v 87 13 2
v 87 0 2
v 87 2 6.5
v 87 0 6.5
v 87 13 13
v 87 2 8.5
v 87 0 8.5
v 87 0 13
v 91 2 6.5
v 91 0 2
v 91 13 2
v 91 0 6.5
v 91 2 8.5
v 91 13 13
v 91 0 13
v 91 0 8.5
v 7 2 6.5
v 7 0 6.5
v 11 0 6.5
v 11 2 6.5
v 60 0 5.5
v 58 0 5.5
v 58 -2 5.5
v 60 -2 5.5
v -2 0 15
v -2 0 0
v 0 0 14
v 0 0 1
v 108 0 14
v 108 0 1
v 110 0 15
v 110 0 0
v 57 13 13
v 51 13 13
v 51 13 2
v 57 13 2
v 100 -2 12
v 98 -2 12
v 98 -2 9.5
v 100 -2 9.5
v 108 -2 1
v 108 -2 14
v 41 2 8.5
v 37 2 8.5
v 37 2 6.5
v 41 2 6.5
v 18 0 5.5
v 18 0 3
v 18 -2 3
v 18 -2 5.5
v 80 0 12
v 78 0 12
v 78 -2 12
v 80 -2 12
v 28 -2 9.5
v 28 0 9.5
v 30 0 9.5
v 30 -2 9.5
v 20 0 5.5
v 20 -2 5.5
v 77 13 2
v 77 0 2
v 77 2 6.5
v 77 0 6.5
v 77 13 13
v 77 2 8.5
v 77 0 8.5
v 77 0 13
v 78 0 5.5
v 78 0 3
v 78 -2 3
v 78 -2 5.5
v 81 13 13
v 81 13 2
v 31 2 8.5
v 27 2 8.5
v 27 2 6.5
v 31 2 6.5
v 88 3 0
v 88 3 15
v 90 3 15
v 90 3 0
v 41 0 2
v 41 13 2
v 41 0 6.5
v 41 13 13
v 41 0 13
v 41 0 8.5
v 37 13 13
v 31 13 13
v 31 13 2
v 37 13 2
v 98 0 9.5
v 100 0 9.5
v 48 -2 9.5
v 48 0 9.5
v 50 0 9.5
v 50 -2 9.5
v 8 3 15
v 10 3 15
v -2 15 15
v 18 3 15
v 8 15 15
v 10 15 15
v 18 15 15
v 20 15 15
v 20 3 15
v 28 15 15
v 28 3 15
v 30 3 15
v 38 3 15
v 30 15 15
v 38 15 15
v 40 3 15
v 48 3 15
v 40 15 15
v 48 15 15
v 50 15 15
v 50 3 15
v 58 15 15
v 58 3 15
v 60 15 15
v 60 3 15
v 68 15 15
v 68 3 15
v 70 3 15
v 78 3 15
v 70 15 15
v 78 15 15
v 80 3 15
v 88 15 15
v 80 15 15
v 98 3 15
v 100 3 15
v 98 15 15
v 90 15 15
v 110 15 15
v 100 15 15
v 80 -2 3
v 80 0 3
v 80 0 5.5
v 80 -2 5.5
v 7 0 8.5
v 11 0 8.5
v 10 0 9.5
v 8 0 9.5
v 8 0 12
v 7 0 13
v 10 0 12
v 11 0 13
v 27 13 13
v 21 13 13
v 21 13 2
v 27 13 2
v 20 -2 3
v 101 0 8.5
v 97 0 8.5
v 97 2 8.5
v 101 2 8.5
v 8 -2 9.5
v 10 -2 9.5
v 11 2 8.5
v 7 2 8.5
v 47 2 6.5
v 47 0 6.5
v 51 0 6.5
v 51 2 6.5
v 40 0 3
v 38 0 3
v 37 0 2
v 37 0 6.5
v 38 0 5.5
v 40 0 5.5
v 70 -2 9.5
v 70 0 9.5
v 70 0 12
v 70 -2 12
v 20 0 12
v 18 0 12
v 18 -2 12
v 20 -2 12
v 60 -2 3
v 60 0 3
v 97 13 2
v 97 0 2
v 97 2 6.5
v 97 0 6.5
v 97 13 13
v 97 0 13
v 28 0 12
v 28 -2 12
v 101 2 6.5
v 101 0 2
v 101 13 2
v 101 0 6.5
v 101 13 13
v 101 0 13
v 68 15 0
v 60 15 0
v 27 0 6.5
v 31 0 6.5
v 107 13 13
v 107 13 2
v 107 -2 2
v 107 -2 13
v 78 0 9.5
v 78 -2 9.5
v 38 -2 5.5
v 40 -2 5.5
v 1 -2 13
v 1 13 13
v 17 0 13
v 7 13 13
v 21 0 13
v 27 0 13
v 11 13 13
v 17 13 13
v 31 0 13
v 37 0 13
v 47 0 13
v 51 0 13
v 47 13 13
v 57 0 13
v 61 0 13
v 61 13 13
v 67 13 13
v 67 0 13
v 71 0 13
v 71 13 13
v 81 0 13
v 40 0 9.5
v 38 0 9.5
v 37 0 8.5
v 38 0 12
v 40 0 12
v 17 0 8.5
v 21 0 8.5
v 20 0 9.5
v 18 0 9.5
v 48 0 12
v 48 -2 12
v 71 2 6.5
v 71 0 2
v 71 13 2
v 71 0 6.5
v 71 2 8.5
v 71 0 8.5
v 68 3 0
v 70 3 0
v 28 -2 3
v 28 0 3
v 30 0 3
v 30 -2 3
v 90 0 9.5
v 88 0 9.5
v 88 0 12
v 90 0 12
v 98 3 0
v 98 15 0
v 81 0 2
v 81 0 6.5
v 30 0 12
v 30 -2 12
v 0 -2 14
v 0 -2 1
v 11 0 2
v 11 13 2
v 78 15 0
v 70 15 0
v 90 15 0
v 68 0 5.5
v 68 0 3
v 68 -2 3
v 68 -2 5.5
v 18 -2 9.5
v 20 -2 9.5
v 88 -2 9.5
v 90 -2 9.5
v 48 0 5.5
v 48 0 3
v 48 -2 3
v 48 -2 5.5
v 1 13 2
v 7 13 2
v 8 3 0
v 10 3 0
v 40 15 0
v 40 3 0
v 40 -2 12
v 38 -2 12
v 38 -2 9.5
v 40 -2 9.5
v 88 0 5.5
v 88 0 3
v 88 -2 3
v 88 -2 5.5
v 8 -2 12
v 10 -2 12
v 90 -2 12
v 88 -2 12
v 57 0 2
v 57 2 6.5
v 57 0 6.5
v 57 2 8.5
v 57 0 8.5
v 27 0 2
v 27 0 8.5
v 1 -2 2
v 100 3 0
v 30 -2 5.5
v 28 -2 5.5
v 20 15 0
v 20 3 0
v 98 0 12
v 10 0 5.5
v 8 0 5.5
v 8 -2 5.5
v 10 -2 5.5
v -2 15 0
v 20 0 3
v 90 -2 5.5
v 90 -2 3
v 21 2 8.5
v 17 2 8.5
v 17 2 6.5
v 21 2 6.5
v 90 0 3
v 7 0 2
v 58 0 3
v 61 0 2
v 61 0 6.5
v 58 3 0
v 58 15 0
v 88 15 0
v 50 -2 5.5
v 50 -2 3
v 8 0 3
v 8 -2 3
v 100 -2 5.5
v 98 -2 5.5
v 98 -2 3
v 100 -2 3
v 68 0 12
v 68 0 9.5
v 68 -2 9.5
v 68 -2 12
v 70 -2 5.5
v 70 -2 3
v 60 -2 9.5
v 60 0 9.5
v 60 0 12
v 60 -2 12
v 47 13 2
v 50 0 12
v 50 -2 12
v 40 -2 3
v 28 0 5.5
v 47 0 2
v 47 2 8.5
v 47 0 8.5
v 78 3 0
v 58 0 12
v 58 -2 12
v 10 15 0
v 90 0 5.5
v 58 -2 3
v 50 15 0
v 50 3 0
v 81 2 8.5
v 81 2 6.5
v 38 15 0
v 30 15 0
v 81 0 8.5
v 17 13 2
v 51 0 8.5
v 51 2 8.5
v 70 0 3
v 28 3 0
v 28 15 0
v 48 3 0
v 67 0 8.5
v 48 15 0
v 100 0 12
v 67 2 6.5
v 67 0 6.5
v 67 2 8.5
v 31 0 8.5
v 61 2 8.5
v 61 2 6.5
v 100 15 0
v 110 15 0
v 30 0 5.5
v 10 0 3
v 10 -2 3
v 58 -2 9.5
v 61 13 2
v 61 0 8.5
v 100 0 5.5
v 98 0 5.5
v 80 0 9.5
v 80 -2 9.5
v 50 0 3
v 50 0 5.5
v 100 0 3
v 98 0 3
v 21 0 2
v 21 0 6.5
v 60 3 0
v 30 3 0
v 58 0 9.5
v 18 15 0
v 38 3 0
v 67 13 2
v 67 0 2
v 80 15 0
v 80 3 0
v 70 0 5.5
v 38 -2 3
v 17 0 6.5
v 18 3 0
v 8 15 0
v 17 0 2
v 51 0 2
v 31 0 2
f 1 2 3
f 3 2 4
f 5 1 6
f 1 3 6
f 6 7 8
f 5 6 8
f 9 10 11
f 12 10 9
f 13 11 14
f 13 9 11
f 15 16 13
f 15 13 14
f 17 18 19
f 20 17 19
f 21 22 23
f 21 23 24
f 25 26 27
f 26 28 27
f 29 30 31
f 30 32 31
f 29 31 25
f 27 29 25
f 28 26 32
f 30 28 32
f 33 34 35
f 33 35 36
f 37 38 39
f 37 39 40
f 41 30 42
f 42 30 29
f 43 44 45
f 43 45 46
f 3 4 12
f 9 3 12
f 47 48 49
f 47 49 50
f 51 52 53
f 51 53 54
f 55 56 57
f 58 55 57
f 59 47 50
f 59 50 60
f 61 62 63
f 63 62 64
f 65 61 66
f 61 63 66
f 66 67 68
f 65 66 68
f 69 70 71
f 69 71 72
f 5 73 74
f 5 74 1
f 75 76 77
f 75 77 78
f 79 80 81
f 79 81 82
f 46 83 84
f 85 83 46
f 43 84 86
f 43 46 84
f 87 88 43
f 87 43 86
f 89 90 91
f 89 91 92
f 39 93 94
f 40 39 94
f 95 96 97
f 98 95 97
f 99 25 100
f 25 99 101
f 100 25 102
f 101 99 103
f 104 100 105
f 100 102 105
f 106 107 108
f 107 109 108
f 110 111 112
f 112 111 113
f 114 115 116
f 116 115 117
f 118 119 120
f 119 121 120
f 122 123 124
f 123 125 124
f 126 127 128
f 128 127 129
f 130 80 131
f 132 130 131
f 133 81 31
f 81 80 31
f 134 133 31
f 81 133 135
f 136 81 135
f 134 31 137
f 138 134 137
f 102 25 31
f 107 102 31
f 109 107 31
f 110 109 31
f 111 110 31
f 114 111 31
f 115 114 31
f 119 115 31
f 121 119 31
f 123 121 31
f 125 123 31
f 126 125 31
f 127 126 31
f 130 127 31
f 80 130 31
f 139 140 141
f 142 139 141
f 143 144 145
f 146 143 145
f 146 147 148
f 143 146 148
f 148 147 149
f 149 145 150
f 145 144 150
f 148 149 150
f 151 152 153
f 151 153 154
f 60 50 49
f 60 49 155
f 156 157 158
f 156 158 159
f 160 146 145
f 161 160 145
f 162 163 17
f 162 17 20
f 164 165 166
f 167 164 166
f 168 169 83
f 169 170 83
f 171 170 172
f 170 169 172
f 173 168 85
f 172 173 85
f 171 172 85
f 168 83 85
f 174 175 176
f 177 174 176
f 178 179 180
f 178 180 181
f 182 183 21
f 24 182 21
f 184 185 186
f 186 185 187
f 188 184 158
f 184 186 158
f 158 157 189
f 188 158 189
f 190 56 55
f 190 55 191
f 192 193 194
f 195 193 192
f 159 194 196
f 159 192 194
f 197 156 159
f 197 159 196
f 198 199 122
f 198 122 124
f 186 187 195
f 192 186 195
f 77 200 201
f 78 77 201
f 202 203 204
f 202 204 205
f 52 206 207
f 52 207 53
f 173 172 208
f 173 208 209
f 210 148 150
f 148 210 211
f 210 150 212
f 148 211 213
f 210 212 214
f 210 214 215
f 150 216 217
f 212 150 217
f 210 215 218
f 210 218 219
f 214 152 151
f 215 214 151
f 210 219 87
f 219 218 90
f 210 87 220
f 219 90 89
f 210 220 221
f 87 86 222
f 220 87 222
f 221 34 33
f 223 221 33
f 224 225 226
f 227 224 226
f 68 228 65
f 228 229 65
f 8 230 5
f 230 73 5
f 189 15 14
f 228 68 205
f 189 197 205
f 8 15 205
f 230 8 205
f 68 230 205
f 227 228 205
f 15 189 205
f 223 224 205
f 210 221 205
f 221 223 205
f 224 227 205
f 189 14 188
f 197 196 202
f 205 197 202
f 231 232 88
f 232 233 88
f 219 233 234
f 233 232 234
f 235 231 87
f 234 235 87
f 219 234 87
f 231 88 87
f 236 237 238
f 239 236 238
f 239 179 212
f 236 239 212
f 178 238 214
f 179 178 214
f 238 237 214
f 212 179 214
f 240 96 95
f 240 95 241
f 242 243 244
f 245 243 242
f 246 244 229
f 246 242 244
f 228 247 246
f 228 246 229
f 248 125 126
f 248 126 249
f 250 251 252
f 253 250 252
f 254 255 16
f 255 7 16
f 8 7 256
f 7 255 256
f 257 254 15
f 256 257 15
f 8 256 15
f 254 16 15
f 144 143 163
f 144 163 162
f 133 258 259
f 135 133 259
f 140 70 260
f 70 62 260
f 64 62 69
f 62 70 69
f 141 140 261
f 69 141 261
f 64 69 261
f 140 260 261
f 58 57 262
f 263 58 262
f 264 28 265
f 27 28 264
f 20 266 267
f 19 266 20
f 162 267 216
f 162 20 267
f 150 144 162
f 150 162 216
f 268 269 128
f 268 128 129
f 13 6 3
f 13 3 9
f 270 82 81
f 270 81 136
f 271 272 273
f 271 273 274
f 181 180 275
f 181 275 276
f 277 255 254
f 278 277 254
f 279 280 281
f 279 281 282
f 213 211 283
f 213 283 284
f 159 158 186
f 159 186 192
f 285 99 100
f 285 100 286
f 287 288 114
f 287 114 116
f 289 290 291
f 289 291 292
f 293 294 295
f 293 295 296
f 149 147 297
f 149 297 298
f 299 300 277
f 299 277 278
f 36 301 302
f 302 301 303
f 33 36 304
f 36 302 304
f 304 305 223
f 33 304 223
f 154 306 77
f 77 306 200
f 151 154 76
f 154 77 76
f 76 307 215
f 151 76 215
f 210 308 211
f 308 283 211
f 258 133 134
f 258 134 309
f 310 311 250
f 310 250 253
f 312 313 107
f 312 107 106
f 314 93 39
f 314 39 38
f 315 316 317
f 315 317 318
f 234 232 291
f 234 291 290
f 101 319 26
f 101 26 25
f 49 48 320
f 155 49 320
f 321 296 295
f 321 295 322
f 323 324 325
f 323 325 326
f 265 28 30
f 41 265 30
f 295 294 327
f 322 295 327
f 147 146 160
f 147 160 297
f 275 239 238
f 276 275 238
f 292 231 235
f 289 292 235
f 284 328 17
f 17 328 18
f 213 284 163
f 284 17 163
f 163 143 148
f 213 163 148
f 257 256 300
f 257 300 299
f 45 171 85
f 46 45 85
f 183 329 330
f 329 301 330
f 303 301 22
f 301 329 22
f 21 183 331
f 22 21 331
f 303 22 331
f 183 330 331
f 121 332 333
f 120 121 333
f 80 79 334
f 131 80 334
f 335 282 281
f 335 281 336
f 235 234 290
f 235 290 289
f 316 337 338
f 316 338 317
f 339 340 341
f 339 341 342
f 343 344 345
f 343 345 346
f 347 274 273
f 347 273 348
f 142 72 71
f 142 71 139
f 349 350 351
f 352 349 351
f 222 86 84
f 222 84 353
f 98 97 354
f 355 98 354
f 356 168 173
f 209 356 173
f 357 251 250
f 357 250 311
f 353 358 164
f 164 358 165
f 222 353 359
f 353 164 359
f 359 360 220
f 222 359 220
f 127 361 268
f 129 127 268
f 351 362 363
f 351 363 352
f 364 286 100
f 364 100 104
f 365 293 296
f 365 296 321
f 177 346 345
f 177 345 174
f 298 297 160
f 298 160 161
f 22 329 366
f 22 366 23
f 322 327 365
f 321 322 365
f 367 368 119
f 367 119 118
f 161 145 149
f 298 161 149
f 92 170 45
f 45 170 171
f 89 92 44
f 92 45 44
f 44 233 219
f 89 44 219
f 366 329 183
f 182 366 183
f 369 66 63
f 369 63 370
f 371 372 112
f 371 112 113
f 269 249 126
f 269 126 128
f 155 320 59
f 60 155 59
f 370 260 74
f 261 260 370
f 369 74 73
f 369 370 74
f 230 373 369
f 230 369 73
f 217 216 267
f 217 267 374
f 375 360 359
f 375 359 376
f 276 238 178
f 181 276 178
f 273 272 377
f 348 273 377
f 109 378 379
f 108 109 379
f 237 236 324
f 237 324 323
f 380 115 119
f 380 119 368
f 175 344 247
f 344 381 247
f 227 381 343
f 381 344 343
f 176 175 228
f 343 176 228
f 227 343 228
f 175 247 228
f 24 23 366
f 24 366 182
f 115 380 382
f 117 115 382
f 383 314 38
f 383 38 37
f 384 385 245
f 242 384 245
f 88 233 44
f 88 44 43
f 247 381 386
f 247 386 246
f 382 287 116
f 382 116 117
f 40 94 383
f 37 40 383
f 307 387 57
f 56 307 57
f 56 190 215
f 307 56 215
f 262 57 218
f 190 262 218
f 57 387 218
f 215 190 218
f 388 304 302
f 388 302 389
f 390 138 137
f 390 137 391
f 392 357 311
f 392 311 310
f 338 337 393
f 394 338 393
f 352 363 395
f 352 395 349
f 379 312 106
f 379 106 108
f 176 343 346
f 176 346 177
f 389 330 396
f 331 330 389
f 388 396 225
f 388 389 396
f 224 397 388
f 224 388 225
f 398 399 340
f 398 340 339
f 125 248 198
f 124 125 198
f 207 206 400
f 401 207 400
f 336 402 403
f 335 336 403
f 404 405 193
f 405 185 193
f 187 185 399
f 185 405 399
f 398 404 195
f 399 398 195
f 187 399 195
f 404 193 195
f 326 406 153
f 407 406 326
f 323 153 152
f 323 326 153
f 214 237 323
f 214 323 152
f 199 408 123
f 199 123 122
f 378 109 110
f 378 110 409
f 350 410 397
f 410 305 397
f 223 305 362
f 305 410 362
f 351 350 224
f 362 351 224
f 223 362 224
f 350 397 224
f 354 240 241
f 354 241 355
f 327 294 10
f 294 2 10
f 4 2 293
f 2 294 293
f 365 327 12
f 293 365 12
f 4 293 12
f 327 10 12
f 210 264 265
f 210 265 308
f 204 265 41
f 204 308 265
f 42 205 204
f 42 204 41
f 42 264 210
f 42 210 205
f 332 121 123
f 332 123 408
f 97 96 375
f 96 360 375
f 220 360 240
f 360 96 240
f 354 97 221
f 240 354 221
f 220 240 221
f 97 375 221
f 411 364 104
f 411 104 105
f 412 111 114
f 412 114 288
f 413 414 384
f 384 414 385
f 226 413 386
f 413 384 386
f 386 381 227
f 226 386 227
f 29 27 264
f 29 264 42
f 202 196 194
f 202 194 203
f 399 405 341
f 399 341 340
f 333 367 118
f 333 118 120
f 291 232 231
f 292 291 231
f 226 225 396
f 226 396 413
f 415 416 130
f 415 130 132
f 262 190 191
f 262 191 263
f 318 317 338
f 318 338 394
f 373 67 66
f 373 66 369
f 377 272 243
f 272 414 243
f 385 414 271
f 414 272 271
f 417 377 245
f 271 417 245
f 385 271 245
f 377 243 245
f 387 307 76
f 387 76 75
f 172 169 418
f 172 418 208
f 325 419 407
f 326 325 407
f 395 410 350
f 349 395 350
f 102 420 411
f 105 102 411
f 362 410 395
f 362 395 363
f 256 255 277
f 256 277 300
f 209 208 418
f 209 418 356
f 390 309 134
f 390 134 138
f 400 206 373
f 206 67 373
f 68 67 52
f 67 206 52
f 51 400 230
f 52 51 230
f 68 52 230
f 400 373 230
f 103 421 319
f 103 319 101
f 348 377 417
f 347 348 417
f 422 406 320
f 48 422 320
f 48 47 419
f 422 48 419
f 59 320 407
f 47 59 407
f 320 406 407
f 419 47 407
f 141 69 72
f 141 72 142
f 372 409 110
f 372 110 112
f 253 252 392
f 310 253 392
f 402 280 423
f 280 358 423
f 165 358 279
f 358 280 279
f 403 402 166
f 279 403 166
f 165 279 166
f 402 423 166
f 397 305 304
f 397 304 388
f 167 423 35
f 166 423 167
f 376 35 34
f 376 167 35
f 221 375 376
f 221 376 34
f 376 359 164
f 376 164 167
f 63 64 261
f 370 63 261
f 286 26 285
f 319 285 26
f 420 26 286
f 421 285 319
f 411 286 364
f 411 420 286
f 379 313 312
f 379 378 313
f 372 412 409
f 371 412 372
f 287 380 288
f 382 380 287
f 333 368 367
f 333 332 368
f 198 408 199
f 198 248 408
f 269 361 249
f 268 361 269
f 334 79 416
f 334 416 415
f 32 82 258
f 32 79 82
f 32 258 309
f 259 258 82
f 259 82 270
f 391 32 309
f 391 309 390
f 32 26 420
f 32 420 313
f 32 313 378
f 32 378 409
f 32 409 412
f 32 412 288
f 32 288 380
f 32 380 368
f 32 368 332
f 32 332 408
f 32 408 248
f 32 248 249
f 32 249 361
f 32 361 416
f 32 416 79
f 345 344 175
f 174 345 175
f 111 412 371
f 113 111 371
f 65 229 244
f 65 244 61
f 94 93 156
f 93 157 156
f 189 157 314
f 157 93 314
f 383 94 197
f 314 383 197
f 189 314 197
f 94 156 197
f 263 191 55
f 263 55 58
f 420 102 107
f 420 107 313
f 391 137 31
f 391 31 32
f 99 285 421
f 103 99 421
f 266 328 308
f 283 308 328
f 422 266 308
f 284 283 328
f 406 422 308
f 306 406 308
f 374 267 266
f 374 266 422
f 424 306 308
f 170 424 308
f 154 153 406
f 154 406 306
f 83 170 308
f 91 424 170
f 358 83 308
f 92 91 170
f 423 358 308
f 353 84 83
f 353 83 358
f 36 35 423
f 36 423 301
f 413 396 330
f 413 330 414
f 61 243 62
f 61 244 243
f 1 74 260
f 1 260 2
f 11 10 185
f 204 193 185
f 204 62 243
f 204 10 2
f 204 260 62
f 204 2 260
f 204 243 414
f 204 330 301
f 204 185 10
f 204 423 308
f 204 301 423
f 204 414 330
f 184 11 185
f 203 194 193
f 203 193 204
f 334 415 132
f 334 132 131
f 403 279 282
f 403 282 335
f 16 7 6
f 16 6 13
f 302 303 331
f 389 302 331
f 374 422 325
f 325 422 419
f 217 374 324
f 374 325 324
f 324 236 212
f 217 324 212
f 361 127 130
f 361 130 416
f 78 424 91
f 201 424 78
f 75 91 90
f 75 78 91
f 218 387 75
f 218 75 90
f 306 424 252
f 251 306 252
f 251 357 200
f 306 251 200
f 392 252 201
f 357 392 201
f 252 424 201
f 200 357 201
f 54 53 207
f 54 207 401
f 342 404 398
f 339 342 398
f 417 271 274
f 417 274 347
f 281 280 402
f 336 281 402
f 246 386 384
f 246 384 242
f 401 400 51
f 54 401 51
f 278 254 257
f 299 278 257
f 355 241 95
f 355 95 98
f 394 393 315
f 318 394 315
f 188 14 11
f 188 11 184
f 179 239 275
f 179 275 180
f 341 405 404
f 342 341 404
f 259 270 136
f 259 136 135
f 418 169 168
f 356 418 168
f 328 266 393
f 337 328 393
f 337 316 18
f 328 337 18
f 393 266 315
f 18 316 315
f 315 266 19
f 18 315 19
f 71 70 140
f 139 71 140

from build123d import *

# Parameters (mm, degrees)
SKETCH1_W                   = 8
SKETCH1_H                   = 15
FIRST_CHAMBER_BLOCK_DEPTH   = 15
SKETCH2_W                   = 6
SKETCH2_H                   = 11
FIRST_CHAMBER_CAVITY_DEPTH  = 13
SKETCH3_W                   = 15
SKETCH3_H                   = 3
CHAMBER_SPACER_DEPTH        = 2
PATTERN_CHAMBERS_COUNT      = 11
PATTERN_CHAMBERS_PITCH      = 10
SKETCH4_W                   = 15
SKETCH4_H                   = 12
THICKEN_END_1_DEPTH         = 2
SKETCH5_W                   = 15
SKETCH5_H                   = 15
THICKEN_END_2_DEPTH         = 2
SKETCH6_W                   = 94
SKETCH6_H                   = 2
CENTRAL_AIR_CHANNEL_DEPTH   = 2
SKETCH7_W                   = 108
SKETCH7_H                   = 13
SKETCH7_W_2                 = 106
SKETCH7_H_2                 = 11
BONDING_RIDGE_DEPTH         = 2
SKETCH9_W                   = 2
SKETCH9_H                   = 2.5
BONDING_BUMPS_DEPTH         = 2
PATTERN_BONDING_BUMPS_COUNT = 10
PATTERN_BONDING_BUMPS_PITCH = 10


with BuildPart() as part:
    # Sketch1 → first chamber block (new body)
    with BuildSketch(Plane.XY):
        with Locations((4, 7.5)):
            Rectangle(SKETCH1_W, SKETCH1_H)
    extrude(amount=FIRST_CHAMBER_BLOCK_DEPTH)

    # Sketch2 → first chamber cavity (cut)
    with BuildSketch(Plane.XZ):
        with Locations((4, 7.5)):
            Rectangle(SKETCH2_W, SKETCH2_H)
    extrude(amount=-FIRST_CHAMBER_CAVITY_DEPTH, mode=Mode.SUBTRACT)

    # Sketch3 → chamber spacer (add)
    with BuildSketch(Plane(origin=(8, 0, 0), x_dir=(0, 0, -1), z_dir=(1, 0, 0))):
        with Locations((-7.5, 1.5)):
            Rectangle(SKETCH3_W, SKETCH3_H)
    extrude(amount=CHAMBER_SPACER_DEPTH)


with BuildPart() as pattern_chambers_1:
    # pattern chambers: pattern copy
    add(part.part.moved(Location(Vector(1, 0, 0) * (1 * PATTERN_CHAMBERS_PITCH))))


with BuildPart() as pattern_chambers_2:
    # pattern chambers: pattern copy
    add(part.part.moved(Location(Vector(1, 0, 0) * (2 * PATTERN_CHAMBERS_PITCH))))


with BuildPart() as pattern_chambers_3:
    # pattern chambers: pattern copy
    add(part.part.moved(Location(Vector(1, 0, 0) * (3 * PATTERN_CHAMBERS_PITCH))))


with BuildPart() as pattern_chambers_4:
    # pattern chambers: pattern copy
    add(part.part.moved(Location(Vector(1, 0, 0) * (4 * PATTERN_CHAMBERS_PITCH))))


with BuildPart() as pattern_chambers_5:
    # pattern chambers: pattern copy
    add(part.part.moved(Location(Vector(1, 0, 0) * (5 * PATTERN_CHAMBERS_PITCH))))


with BuildPart() as pattern_chambers_6:
    # pattern chambers: pattern copy
    add(part.part.moved(Location(Vector(1, 0, 0) * (6 * PATTERN_CHAMBERS_PITCH))))


with BuildPart() as pattern_chambers_7:
    # pattern chambers: pattern copy
    add(part.part.moved(Location(Vector(1, 0, 0) * (7 * PATTERN_CHAMBERS_PITCH))))


with BuildPart() as pattern_chambers_8:
    # pattern chambers: pattern copy
    add(part.part.moved(Location(Vector(1, 0, 0) * (8 * PATTERN_CHAMBERS_PITCH))))


with BuildPart() as pattern_chambers_9:
    # pattern chambers: pattern copy
    add(part.part.moved(Location(Vector(1, 0, 0) * (9 * PATTERN_CHAMBERS_PITCH))))


with BuildPart() as pattern_chambers_10:
    # pattern chambers: pattern copy
    add(part.part.moved(Location(Vector(1, 0, 0) * (10 * PATTERN_CHAMBERS_PITCH))))

    # combine into 1 solid body: union pattern chambers_9, pattern chambers_8, pattern chambers_7, pattern chambers_6, pattern chambers_5, pattern chambers_4, pattern chambers_3, pattern chambers_2, pattern chambers_1, part
    add(pattern_chambers_9.part)
    add(pattern_chambers_8.part)
    add(pattern_chambers_7.part)
    add(pattern_chambers_6.part)
    add(pattern_chambers_5.part)
    add(pattern_chambers_4.part)
    add(pattern_chambers_3.part)
    add(pattern_chambers_2.part)
    add(pattern_chambers_1.part)
    add(part.part)

    # Sketch4 → thicken end 1 (add)
    with BuildSketch(Plane(origin=(108, 0, 0), x_dir=(0, 0, -1), z_dir=(1, 0, 0))):
        with Locations((-7.5, 9)):
            Rectangle(SKETCH4_W, SKETCH4_H)
    extrude(amount=THICKEN_END_1_DEPTH)

    # Sketch5 → thicken end 2 (add)
    with BuildSketch(Plane.ZY):
        with Locations((7.5, 7.5)):
            Rectangle(SKETCH5_W, SKETCH5_H)
    extrude(amount=THICKEN_END_2_DEPTH)

    # Sketch6 → central air channel (cut)
    with BuildSketch(Plane.XZ):
        with Locations((54, 7.5)):
            Rectangle(SKETCH6_W, SKETCH6_H)
    extrude(amount=-CENTRAL_AIR_CHANNEL_DEPTH, mode=Mode.SUBTRACT)

    # Sketch7 → bonding ridge (add)
    with BuildSketch(Plane.XZ):
        with Locations((54, 7.5)):
            Rectangle(SKETCH7_W, SKETCH7_H)
        with Locations((54, 7.5)):
            Rectangle(SKETCH7_W_2, SKETCH7_H_2, mode=Mode.SUBTRACT)
    extrude(amount=BONDING_RIDGE_DEPTH)

    # Sketch9 → bonding bumps (add)
    with BuildSketch(Plane.XZ):
        with Locations((9, 10.75)):
            Rectangle(SKETCH9_W, SKETCH9_H)
        with Locations((9, 4.25)):
            Rectangle(SKETCH9_W, SKETCH9_H)
    bonding_bumps = extrude(amount=BONDING_BUMPS_DEPTH)

    # pattern bonding bumps: bonding bumps ×10
    with Locations(*[(i * PATTERN_BONDING_BUMPS_PITCH, 0, 0) for i in range(1, PATTERN_BONDING_BUMPS_COUNT)]):
        add(bonding_bumps)


solid = pattern_chambers_10.part
